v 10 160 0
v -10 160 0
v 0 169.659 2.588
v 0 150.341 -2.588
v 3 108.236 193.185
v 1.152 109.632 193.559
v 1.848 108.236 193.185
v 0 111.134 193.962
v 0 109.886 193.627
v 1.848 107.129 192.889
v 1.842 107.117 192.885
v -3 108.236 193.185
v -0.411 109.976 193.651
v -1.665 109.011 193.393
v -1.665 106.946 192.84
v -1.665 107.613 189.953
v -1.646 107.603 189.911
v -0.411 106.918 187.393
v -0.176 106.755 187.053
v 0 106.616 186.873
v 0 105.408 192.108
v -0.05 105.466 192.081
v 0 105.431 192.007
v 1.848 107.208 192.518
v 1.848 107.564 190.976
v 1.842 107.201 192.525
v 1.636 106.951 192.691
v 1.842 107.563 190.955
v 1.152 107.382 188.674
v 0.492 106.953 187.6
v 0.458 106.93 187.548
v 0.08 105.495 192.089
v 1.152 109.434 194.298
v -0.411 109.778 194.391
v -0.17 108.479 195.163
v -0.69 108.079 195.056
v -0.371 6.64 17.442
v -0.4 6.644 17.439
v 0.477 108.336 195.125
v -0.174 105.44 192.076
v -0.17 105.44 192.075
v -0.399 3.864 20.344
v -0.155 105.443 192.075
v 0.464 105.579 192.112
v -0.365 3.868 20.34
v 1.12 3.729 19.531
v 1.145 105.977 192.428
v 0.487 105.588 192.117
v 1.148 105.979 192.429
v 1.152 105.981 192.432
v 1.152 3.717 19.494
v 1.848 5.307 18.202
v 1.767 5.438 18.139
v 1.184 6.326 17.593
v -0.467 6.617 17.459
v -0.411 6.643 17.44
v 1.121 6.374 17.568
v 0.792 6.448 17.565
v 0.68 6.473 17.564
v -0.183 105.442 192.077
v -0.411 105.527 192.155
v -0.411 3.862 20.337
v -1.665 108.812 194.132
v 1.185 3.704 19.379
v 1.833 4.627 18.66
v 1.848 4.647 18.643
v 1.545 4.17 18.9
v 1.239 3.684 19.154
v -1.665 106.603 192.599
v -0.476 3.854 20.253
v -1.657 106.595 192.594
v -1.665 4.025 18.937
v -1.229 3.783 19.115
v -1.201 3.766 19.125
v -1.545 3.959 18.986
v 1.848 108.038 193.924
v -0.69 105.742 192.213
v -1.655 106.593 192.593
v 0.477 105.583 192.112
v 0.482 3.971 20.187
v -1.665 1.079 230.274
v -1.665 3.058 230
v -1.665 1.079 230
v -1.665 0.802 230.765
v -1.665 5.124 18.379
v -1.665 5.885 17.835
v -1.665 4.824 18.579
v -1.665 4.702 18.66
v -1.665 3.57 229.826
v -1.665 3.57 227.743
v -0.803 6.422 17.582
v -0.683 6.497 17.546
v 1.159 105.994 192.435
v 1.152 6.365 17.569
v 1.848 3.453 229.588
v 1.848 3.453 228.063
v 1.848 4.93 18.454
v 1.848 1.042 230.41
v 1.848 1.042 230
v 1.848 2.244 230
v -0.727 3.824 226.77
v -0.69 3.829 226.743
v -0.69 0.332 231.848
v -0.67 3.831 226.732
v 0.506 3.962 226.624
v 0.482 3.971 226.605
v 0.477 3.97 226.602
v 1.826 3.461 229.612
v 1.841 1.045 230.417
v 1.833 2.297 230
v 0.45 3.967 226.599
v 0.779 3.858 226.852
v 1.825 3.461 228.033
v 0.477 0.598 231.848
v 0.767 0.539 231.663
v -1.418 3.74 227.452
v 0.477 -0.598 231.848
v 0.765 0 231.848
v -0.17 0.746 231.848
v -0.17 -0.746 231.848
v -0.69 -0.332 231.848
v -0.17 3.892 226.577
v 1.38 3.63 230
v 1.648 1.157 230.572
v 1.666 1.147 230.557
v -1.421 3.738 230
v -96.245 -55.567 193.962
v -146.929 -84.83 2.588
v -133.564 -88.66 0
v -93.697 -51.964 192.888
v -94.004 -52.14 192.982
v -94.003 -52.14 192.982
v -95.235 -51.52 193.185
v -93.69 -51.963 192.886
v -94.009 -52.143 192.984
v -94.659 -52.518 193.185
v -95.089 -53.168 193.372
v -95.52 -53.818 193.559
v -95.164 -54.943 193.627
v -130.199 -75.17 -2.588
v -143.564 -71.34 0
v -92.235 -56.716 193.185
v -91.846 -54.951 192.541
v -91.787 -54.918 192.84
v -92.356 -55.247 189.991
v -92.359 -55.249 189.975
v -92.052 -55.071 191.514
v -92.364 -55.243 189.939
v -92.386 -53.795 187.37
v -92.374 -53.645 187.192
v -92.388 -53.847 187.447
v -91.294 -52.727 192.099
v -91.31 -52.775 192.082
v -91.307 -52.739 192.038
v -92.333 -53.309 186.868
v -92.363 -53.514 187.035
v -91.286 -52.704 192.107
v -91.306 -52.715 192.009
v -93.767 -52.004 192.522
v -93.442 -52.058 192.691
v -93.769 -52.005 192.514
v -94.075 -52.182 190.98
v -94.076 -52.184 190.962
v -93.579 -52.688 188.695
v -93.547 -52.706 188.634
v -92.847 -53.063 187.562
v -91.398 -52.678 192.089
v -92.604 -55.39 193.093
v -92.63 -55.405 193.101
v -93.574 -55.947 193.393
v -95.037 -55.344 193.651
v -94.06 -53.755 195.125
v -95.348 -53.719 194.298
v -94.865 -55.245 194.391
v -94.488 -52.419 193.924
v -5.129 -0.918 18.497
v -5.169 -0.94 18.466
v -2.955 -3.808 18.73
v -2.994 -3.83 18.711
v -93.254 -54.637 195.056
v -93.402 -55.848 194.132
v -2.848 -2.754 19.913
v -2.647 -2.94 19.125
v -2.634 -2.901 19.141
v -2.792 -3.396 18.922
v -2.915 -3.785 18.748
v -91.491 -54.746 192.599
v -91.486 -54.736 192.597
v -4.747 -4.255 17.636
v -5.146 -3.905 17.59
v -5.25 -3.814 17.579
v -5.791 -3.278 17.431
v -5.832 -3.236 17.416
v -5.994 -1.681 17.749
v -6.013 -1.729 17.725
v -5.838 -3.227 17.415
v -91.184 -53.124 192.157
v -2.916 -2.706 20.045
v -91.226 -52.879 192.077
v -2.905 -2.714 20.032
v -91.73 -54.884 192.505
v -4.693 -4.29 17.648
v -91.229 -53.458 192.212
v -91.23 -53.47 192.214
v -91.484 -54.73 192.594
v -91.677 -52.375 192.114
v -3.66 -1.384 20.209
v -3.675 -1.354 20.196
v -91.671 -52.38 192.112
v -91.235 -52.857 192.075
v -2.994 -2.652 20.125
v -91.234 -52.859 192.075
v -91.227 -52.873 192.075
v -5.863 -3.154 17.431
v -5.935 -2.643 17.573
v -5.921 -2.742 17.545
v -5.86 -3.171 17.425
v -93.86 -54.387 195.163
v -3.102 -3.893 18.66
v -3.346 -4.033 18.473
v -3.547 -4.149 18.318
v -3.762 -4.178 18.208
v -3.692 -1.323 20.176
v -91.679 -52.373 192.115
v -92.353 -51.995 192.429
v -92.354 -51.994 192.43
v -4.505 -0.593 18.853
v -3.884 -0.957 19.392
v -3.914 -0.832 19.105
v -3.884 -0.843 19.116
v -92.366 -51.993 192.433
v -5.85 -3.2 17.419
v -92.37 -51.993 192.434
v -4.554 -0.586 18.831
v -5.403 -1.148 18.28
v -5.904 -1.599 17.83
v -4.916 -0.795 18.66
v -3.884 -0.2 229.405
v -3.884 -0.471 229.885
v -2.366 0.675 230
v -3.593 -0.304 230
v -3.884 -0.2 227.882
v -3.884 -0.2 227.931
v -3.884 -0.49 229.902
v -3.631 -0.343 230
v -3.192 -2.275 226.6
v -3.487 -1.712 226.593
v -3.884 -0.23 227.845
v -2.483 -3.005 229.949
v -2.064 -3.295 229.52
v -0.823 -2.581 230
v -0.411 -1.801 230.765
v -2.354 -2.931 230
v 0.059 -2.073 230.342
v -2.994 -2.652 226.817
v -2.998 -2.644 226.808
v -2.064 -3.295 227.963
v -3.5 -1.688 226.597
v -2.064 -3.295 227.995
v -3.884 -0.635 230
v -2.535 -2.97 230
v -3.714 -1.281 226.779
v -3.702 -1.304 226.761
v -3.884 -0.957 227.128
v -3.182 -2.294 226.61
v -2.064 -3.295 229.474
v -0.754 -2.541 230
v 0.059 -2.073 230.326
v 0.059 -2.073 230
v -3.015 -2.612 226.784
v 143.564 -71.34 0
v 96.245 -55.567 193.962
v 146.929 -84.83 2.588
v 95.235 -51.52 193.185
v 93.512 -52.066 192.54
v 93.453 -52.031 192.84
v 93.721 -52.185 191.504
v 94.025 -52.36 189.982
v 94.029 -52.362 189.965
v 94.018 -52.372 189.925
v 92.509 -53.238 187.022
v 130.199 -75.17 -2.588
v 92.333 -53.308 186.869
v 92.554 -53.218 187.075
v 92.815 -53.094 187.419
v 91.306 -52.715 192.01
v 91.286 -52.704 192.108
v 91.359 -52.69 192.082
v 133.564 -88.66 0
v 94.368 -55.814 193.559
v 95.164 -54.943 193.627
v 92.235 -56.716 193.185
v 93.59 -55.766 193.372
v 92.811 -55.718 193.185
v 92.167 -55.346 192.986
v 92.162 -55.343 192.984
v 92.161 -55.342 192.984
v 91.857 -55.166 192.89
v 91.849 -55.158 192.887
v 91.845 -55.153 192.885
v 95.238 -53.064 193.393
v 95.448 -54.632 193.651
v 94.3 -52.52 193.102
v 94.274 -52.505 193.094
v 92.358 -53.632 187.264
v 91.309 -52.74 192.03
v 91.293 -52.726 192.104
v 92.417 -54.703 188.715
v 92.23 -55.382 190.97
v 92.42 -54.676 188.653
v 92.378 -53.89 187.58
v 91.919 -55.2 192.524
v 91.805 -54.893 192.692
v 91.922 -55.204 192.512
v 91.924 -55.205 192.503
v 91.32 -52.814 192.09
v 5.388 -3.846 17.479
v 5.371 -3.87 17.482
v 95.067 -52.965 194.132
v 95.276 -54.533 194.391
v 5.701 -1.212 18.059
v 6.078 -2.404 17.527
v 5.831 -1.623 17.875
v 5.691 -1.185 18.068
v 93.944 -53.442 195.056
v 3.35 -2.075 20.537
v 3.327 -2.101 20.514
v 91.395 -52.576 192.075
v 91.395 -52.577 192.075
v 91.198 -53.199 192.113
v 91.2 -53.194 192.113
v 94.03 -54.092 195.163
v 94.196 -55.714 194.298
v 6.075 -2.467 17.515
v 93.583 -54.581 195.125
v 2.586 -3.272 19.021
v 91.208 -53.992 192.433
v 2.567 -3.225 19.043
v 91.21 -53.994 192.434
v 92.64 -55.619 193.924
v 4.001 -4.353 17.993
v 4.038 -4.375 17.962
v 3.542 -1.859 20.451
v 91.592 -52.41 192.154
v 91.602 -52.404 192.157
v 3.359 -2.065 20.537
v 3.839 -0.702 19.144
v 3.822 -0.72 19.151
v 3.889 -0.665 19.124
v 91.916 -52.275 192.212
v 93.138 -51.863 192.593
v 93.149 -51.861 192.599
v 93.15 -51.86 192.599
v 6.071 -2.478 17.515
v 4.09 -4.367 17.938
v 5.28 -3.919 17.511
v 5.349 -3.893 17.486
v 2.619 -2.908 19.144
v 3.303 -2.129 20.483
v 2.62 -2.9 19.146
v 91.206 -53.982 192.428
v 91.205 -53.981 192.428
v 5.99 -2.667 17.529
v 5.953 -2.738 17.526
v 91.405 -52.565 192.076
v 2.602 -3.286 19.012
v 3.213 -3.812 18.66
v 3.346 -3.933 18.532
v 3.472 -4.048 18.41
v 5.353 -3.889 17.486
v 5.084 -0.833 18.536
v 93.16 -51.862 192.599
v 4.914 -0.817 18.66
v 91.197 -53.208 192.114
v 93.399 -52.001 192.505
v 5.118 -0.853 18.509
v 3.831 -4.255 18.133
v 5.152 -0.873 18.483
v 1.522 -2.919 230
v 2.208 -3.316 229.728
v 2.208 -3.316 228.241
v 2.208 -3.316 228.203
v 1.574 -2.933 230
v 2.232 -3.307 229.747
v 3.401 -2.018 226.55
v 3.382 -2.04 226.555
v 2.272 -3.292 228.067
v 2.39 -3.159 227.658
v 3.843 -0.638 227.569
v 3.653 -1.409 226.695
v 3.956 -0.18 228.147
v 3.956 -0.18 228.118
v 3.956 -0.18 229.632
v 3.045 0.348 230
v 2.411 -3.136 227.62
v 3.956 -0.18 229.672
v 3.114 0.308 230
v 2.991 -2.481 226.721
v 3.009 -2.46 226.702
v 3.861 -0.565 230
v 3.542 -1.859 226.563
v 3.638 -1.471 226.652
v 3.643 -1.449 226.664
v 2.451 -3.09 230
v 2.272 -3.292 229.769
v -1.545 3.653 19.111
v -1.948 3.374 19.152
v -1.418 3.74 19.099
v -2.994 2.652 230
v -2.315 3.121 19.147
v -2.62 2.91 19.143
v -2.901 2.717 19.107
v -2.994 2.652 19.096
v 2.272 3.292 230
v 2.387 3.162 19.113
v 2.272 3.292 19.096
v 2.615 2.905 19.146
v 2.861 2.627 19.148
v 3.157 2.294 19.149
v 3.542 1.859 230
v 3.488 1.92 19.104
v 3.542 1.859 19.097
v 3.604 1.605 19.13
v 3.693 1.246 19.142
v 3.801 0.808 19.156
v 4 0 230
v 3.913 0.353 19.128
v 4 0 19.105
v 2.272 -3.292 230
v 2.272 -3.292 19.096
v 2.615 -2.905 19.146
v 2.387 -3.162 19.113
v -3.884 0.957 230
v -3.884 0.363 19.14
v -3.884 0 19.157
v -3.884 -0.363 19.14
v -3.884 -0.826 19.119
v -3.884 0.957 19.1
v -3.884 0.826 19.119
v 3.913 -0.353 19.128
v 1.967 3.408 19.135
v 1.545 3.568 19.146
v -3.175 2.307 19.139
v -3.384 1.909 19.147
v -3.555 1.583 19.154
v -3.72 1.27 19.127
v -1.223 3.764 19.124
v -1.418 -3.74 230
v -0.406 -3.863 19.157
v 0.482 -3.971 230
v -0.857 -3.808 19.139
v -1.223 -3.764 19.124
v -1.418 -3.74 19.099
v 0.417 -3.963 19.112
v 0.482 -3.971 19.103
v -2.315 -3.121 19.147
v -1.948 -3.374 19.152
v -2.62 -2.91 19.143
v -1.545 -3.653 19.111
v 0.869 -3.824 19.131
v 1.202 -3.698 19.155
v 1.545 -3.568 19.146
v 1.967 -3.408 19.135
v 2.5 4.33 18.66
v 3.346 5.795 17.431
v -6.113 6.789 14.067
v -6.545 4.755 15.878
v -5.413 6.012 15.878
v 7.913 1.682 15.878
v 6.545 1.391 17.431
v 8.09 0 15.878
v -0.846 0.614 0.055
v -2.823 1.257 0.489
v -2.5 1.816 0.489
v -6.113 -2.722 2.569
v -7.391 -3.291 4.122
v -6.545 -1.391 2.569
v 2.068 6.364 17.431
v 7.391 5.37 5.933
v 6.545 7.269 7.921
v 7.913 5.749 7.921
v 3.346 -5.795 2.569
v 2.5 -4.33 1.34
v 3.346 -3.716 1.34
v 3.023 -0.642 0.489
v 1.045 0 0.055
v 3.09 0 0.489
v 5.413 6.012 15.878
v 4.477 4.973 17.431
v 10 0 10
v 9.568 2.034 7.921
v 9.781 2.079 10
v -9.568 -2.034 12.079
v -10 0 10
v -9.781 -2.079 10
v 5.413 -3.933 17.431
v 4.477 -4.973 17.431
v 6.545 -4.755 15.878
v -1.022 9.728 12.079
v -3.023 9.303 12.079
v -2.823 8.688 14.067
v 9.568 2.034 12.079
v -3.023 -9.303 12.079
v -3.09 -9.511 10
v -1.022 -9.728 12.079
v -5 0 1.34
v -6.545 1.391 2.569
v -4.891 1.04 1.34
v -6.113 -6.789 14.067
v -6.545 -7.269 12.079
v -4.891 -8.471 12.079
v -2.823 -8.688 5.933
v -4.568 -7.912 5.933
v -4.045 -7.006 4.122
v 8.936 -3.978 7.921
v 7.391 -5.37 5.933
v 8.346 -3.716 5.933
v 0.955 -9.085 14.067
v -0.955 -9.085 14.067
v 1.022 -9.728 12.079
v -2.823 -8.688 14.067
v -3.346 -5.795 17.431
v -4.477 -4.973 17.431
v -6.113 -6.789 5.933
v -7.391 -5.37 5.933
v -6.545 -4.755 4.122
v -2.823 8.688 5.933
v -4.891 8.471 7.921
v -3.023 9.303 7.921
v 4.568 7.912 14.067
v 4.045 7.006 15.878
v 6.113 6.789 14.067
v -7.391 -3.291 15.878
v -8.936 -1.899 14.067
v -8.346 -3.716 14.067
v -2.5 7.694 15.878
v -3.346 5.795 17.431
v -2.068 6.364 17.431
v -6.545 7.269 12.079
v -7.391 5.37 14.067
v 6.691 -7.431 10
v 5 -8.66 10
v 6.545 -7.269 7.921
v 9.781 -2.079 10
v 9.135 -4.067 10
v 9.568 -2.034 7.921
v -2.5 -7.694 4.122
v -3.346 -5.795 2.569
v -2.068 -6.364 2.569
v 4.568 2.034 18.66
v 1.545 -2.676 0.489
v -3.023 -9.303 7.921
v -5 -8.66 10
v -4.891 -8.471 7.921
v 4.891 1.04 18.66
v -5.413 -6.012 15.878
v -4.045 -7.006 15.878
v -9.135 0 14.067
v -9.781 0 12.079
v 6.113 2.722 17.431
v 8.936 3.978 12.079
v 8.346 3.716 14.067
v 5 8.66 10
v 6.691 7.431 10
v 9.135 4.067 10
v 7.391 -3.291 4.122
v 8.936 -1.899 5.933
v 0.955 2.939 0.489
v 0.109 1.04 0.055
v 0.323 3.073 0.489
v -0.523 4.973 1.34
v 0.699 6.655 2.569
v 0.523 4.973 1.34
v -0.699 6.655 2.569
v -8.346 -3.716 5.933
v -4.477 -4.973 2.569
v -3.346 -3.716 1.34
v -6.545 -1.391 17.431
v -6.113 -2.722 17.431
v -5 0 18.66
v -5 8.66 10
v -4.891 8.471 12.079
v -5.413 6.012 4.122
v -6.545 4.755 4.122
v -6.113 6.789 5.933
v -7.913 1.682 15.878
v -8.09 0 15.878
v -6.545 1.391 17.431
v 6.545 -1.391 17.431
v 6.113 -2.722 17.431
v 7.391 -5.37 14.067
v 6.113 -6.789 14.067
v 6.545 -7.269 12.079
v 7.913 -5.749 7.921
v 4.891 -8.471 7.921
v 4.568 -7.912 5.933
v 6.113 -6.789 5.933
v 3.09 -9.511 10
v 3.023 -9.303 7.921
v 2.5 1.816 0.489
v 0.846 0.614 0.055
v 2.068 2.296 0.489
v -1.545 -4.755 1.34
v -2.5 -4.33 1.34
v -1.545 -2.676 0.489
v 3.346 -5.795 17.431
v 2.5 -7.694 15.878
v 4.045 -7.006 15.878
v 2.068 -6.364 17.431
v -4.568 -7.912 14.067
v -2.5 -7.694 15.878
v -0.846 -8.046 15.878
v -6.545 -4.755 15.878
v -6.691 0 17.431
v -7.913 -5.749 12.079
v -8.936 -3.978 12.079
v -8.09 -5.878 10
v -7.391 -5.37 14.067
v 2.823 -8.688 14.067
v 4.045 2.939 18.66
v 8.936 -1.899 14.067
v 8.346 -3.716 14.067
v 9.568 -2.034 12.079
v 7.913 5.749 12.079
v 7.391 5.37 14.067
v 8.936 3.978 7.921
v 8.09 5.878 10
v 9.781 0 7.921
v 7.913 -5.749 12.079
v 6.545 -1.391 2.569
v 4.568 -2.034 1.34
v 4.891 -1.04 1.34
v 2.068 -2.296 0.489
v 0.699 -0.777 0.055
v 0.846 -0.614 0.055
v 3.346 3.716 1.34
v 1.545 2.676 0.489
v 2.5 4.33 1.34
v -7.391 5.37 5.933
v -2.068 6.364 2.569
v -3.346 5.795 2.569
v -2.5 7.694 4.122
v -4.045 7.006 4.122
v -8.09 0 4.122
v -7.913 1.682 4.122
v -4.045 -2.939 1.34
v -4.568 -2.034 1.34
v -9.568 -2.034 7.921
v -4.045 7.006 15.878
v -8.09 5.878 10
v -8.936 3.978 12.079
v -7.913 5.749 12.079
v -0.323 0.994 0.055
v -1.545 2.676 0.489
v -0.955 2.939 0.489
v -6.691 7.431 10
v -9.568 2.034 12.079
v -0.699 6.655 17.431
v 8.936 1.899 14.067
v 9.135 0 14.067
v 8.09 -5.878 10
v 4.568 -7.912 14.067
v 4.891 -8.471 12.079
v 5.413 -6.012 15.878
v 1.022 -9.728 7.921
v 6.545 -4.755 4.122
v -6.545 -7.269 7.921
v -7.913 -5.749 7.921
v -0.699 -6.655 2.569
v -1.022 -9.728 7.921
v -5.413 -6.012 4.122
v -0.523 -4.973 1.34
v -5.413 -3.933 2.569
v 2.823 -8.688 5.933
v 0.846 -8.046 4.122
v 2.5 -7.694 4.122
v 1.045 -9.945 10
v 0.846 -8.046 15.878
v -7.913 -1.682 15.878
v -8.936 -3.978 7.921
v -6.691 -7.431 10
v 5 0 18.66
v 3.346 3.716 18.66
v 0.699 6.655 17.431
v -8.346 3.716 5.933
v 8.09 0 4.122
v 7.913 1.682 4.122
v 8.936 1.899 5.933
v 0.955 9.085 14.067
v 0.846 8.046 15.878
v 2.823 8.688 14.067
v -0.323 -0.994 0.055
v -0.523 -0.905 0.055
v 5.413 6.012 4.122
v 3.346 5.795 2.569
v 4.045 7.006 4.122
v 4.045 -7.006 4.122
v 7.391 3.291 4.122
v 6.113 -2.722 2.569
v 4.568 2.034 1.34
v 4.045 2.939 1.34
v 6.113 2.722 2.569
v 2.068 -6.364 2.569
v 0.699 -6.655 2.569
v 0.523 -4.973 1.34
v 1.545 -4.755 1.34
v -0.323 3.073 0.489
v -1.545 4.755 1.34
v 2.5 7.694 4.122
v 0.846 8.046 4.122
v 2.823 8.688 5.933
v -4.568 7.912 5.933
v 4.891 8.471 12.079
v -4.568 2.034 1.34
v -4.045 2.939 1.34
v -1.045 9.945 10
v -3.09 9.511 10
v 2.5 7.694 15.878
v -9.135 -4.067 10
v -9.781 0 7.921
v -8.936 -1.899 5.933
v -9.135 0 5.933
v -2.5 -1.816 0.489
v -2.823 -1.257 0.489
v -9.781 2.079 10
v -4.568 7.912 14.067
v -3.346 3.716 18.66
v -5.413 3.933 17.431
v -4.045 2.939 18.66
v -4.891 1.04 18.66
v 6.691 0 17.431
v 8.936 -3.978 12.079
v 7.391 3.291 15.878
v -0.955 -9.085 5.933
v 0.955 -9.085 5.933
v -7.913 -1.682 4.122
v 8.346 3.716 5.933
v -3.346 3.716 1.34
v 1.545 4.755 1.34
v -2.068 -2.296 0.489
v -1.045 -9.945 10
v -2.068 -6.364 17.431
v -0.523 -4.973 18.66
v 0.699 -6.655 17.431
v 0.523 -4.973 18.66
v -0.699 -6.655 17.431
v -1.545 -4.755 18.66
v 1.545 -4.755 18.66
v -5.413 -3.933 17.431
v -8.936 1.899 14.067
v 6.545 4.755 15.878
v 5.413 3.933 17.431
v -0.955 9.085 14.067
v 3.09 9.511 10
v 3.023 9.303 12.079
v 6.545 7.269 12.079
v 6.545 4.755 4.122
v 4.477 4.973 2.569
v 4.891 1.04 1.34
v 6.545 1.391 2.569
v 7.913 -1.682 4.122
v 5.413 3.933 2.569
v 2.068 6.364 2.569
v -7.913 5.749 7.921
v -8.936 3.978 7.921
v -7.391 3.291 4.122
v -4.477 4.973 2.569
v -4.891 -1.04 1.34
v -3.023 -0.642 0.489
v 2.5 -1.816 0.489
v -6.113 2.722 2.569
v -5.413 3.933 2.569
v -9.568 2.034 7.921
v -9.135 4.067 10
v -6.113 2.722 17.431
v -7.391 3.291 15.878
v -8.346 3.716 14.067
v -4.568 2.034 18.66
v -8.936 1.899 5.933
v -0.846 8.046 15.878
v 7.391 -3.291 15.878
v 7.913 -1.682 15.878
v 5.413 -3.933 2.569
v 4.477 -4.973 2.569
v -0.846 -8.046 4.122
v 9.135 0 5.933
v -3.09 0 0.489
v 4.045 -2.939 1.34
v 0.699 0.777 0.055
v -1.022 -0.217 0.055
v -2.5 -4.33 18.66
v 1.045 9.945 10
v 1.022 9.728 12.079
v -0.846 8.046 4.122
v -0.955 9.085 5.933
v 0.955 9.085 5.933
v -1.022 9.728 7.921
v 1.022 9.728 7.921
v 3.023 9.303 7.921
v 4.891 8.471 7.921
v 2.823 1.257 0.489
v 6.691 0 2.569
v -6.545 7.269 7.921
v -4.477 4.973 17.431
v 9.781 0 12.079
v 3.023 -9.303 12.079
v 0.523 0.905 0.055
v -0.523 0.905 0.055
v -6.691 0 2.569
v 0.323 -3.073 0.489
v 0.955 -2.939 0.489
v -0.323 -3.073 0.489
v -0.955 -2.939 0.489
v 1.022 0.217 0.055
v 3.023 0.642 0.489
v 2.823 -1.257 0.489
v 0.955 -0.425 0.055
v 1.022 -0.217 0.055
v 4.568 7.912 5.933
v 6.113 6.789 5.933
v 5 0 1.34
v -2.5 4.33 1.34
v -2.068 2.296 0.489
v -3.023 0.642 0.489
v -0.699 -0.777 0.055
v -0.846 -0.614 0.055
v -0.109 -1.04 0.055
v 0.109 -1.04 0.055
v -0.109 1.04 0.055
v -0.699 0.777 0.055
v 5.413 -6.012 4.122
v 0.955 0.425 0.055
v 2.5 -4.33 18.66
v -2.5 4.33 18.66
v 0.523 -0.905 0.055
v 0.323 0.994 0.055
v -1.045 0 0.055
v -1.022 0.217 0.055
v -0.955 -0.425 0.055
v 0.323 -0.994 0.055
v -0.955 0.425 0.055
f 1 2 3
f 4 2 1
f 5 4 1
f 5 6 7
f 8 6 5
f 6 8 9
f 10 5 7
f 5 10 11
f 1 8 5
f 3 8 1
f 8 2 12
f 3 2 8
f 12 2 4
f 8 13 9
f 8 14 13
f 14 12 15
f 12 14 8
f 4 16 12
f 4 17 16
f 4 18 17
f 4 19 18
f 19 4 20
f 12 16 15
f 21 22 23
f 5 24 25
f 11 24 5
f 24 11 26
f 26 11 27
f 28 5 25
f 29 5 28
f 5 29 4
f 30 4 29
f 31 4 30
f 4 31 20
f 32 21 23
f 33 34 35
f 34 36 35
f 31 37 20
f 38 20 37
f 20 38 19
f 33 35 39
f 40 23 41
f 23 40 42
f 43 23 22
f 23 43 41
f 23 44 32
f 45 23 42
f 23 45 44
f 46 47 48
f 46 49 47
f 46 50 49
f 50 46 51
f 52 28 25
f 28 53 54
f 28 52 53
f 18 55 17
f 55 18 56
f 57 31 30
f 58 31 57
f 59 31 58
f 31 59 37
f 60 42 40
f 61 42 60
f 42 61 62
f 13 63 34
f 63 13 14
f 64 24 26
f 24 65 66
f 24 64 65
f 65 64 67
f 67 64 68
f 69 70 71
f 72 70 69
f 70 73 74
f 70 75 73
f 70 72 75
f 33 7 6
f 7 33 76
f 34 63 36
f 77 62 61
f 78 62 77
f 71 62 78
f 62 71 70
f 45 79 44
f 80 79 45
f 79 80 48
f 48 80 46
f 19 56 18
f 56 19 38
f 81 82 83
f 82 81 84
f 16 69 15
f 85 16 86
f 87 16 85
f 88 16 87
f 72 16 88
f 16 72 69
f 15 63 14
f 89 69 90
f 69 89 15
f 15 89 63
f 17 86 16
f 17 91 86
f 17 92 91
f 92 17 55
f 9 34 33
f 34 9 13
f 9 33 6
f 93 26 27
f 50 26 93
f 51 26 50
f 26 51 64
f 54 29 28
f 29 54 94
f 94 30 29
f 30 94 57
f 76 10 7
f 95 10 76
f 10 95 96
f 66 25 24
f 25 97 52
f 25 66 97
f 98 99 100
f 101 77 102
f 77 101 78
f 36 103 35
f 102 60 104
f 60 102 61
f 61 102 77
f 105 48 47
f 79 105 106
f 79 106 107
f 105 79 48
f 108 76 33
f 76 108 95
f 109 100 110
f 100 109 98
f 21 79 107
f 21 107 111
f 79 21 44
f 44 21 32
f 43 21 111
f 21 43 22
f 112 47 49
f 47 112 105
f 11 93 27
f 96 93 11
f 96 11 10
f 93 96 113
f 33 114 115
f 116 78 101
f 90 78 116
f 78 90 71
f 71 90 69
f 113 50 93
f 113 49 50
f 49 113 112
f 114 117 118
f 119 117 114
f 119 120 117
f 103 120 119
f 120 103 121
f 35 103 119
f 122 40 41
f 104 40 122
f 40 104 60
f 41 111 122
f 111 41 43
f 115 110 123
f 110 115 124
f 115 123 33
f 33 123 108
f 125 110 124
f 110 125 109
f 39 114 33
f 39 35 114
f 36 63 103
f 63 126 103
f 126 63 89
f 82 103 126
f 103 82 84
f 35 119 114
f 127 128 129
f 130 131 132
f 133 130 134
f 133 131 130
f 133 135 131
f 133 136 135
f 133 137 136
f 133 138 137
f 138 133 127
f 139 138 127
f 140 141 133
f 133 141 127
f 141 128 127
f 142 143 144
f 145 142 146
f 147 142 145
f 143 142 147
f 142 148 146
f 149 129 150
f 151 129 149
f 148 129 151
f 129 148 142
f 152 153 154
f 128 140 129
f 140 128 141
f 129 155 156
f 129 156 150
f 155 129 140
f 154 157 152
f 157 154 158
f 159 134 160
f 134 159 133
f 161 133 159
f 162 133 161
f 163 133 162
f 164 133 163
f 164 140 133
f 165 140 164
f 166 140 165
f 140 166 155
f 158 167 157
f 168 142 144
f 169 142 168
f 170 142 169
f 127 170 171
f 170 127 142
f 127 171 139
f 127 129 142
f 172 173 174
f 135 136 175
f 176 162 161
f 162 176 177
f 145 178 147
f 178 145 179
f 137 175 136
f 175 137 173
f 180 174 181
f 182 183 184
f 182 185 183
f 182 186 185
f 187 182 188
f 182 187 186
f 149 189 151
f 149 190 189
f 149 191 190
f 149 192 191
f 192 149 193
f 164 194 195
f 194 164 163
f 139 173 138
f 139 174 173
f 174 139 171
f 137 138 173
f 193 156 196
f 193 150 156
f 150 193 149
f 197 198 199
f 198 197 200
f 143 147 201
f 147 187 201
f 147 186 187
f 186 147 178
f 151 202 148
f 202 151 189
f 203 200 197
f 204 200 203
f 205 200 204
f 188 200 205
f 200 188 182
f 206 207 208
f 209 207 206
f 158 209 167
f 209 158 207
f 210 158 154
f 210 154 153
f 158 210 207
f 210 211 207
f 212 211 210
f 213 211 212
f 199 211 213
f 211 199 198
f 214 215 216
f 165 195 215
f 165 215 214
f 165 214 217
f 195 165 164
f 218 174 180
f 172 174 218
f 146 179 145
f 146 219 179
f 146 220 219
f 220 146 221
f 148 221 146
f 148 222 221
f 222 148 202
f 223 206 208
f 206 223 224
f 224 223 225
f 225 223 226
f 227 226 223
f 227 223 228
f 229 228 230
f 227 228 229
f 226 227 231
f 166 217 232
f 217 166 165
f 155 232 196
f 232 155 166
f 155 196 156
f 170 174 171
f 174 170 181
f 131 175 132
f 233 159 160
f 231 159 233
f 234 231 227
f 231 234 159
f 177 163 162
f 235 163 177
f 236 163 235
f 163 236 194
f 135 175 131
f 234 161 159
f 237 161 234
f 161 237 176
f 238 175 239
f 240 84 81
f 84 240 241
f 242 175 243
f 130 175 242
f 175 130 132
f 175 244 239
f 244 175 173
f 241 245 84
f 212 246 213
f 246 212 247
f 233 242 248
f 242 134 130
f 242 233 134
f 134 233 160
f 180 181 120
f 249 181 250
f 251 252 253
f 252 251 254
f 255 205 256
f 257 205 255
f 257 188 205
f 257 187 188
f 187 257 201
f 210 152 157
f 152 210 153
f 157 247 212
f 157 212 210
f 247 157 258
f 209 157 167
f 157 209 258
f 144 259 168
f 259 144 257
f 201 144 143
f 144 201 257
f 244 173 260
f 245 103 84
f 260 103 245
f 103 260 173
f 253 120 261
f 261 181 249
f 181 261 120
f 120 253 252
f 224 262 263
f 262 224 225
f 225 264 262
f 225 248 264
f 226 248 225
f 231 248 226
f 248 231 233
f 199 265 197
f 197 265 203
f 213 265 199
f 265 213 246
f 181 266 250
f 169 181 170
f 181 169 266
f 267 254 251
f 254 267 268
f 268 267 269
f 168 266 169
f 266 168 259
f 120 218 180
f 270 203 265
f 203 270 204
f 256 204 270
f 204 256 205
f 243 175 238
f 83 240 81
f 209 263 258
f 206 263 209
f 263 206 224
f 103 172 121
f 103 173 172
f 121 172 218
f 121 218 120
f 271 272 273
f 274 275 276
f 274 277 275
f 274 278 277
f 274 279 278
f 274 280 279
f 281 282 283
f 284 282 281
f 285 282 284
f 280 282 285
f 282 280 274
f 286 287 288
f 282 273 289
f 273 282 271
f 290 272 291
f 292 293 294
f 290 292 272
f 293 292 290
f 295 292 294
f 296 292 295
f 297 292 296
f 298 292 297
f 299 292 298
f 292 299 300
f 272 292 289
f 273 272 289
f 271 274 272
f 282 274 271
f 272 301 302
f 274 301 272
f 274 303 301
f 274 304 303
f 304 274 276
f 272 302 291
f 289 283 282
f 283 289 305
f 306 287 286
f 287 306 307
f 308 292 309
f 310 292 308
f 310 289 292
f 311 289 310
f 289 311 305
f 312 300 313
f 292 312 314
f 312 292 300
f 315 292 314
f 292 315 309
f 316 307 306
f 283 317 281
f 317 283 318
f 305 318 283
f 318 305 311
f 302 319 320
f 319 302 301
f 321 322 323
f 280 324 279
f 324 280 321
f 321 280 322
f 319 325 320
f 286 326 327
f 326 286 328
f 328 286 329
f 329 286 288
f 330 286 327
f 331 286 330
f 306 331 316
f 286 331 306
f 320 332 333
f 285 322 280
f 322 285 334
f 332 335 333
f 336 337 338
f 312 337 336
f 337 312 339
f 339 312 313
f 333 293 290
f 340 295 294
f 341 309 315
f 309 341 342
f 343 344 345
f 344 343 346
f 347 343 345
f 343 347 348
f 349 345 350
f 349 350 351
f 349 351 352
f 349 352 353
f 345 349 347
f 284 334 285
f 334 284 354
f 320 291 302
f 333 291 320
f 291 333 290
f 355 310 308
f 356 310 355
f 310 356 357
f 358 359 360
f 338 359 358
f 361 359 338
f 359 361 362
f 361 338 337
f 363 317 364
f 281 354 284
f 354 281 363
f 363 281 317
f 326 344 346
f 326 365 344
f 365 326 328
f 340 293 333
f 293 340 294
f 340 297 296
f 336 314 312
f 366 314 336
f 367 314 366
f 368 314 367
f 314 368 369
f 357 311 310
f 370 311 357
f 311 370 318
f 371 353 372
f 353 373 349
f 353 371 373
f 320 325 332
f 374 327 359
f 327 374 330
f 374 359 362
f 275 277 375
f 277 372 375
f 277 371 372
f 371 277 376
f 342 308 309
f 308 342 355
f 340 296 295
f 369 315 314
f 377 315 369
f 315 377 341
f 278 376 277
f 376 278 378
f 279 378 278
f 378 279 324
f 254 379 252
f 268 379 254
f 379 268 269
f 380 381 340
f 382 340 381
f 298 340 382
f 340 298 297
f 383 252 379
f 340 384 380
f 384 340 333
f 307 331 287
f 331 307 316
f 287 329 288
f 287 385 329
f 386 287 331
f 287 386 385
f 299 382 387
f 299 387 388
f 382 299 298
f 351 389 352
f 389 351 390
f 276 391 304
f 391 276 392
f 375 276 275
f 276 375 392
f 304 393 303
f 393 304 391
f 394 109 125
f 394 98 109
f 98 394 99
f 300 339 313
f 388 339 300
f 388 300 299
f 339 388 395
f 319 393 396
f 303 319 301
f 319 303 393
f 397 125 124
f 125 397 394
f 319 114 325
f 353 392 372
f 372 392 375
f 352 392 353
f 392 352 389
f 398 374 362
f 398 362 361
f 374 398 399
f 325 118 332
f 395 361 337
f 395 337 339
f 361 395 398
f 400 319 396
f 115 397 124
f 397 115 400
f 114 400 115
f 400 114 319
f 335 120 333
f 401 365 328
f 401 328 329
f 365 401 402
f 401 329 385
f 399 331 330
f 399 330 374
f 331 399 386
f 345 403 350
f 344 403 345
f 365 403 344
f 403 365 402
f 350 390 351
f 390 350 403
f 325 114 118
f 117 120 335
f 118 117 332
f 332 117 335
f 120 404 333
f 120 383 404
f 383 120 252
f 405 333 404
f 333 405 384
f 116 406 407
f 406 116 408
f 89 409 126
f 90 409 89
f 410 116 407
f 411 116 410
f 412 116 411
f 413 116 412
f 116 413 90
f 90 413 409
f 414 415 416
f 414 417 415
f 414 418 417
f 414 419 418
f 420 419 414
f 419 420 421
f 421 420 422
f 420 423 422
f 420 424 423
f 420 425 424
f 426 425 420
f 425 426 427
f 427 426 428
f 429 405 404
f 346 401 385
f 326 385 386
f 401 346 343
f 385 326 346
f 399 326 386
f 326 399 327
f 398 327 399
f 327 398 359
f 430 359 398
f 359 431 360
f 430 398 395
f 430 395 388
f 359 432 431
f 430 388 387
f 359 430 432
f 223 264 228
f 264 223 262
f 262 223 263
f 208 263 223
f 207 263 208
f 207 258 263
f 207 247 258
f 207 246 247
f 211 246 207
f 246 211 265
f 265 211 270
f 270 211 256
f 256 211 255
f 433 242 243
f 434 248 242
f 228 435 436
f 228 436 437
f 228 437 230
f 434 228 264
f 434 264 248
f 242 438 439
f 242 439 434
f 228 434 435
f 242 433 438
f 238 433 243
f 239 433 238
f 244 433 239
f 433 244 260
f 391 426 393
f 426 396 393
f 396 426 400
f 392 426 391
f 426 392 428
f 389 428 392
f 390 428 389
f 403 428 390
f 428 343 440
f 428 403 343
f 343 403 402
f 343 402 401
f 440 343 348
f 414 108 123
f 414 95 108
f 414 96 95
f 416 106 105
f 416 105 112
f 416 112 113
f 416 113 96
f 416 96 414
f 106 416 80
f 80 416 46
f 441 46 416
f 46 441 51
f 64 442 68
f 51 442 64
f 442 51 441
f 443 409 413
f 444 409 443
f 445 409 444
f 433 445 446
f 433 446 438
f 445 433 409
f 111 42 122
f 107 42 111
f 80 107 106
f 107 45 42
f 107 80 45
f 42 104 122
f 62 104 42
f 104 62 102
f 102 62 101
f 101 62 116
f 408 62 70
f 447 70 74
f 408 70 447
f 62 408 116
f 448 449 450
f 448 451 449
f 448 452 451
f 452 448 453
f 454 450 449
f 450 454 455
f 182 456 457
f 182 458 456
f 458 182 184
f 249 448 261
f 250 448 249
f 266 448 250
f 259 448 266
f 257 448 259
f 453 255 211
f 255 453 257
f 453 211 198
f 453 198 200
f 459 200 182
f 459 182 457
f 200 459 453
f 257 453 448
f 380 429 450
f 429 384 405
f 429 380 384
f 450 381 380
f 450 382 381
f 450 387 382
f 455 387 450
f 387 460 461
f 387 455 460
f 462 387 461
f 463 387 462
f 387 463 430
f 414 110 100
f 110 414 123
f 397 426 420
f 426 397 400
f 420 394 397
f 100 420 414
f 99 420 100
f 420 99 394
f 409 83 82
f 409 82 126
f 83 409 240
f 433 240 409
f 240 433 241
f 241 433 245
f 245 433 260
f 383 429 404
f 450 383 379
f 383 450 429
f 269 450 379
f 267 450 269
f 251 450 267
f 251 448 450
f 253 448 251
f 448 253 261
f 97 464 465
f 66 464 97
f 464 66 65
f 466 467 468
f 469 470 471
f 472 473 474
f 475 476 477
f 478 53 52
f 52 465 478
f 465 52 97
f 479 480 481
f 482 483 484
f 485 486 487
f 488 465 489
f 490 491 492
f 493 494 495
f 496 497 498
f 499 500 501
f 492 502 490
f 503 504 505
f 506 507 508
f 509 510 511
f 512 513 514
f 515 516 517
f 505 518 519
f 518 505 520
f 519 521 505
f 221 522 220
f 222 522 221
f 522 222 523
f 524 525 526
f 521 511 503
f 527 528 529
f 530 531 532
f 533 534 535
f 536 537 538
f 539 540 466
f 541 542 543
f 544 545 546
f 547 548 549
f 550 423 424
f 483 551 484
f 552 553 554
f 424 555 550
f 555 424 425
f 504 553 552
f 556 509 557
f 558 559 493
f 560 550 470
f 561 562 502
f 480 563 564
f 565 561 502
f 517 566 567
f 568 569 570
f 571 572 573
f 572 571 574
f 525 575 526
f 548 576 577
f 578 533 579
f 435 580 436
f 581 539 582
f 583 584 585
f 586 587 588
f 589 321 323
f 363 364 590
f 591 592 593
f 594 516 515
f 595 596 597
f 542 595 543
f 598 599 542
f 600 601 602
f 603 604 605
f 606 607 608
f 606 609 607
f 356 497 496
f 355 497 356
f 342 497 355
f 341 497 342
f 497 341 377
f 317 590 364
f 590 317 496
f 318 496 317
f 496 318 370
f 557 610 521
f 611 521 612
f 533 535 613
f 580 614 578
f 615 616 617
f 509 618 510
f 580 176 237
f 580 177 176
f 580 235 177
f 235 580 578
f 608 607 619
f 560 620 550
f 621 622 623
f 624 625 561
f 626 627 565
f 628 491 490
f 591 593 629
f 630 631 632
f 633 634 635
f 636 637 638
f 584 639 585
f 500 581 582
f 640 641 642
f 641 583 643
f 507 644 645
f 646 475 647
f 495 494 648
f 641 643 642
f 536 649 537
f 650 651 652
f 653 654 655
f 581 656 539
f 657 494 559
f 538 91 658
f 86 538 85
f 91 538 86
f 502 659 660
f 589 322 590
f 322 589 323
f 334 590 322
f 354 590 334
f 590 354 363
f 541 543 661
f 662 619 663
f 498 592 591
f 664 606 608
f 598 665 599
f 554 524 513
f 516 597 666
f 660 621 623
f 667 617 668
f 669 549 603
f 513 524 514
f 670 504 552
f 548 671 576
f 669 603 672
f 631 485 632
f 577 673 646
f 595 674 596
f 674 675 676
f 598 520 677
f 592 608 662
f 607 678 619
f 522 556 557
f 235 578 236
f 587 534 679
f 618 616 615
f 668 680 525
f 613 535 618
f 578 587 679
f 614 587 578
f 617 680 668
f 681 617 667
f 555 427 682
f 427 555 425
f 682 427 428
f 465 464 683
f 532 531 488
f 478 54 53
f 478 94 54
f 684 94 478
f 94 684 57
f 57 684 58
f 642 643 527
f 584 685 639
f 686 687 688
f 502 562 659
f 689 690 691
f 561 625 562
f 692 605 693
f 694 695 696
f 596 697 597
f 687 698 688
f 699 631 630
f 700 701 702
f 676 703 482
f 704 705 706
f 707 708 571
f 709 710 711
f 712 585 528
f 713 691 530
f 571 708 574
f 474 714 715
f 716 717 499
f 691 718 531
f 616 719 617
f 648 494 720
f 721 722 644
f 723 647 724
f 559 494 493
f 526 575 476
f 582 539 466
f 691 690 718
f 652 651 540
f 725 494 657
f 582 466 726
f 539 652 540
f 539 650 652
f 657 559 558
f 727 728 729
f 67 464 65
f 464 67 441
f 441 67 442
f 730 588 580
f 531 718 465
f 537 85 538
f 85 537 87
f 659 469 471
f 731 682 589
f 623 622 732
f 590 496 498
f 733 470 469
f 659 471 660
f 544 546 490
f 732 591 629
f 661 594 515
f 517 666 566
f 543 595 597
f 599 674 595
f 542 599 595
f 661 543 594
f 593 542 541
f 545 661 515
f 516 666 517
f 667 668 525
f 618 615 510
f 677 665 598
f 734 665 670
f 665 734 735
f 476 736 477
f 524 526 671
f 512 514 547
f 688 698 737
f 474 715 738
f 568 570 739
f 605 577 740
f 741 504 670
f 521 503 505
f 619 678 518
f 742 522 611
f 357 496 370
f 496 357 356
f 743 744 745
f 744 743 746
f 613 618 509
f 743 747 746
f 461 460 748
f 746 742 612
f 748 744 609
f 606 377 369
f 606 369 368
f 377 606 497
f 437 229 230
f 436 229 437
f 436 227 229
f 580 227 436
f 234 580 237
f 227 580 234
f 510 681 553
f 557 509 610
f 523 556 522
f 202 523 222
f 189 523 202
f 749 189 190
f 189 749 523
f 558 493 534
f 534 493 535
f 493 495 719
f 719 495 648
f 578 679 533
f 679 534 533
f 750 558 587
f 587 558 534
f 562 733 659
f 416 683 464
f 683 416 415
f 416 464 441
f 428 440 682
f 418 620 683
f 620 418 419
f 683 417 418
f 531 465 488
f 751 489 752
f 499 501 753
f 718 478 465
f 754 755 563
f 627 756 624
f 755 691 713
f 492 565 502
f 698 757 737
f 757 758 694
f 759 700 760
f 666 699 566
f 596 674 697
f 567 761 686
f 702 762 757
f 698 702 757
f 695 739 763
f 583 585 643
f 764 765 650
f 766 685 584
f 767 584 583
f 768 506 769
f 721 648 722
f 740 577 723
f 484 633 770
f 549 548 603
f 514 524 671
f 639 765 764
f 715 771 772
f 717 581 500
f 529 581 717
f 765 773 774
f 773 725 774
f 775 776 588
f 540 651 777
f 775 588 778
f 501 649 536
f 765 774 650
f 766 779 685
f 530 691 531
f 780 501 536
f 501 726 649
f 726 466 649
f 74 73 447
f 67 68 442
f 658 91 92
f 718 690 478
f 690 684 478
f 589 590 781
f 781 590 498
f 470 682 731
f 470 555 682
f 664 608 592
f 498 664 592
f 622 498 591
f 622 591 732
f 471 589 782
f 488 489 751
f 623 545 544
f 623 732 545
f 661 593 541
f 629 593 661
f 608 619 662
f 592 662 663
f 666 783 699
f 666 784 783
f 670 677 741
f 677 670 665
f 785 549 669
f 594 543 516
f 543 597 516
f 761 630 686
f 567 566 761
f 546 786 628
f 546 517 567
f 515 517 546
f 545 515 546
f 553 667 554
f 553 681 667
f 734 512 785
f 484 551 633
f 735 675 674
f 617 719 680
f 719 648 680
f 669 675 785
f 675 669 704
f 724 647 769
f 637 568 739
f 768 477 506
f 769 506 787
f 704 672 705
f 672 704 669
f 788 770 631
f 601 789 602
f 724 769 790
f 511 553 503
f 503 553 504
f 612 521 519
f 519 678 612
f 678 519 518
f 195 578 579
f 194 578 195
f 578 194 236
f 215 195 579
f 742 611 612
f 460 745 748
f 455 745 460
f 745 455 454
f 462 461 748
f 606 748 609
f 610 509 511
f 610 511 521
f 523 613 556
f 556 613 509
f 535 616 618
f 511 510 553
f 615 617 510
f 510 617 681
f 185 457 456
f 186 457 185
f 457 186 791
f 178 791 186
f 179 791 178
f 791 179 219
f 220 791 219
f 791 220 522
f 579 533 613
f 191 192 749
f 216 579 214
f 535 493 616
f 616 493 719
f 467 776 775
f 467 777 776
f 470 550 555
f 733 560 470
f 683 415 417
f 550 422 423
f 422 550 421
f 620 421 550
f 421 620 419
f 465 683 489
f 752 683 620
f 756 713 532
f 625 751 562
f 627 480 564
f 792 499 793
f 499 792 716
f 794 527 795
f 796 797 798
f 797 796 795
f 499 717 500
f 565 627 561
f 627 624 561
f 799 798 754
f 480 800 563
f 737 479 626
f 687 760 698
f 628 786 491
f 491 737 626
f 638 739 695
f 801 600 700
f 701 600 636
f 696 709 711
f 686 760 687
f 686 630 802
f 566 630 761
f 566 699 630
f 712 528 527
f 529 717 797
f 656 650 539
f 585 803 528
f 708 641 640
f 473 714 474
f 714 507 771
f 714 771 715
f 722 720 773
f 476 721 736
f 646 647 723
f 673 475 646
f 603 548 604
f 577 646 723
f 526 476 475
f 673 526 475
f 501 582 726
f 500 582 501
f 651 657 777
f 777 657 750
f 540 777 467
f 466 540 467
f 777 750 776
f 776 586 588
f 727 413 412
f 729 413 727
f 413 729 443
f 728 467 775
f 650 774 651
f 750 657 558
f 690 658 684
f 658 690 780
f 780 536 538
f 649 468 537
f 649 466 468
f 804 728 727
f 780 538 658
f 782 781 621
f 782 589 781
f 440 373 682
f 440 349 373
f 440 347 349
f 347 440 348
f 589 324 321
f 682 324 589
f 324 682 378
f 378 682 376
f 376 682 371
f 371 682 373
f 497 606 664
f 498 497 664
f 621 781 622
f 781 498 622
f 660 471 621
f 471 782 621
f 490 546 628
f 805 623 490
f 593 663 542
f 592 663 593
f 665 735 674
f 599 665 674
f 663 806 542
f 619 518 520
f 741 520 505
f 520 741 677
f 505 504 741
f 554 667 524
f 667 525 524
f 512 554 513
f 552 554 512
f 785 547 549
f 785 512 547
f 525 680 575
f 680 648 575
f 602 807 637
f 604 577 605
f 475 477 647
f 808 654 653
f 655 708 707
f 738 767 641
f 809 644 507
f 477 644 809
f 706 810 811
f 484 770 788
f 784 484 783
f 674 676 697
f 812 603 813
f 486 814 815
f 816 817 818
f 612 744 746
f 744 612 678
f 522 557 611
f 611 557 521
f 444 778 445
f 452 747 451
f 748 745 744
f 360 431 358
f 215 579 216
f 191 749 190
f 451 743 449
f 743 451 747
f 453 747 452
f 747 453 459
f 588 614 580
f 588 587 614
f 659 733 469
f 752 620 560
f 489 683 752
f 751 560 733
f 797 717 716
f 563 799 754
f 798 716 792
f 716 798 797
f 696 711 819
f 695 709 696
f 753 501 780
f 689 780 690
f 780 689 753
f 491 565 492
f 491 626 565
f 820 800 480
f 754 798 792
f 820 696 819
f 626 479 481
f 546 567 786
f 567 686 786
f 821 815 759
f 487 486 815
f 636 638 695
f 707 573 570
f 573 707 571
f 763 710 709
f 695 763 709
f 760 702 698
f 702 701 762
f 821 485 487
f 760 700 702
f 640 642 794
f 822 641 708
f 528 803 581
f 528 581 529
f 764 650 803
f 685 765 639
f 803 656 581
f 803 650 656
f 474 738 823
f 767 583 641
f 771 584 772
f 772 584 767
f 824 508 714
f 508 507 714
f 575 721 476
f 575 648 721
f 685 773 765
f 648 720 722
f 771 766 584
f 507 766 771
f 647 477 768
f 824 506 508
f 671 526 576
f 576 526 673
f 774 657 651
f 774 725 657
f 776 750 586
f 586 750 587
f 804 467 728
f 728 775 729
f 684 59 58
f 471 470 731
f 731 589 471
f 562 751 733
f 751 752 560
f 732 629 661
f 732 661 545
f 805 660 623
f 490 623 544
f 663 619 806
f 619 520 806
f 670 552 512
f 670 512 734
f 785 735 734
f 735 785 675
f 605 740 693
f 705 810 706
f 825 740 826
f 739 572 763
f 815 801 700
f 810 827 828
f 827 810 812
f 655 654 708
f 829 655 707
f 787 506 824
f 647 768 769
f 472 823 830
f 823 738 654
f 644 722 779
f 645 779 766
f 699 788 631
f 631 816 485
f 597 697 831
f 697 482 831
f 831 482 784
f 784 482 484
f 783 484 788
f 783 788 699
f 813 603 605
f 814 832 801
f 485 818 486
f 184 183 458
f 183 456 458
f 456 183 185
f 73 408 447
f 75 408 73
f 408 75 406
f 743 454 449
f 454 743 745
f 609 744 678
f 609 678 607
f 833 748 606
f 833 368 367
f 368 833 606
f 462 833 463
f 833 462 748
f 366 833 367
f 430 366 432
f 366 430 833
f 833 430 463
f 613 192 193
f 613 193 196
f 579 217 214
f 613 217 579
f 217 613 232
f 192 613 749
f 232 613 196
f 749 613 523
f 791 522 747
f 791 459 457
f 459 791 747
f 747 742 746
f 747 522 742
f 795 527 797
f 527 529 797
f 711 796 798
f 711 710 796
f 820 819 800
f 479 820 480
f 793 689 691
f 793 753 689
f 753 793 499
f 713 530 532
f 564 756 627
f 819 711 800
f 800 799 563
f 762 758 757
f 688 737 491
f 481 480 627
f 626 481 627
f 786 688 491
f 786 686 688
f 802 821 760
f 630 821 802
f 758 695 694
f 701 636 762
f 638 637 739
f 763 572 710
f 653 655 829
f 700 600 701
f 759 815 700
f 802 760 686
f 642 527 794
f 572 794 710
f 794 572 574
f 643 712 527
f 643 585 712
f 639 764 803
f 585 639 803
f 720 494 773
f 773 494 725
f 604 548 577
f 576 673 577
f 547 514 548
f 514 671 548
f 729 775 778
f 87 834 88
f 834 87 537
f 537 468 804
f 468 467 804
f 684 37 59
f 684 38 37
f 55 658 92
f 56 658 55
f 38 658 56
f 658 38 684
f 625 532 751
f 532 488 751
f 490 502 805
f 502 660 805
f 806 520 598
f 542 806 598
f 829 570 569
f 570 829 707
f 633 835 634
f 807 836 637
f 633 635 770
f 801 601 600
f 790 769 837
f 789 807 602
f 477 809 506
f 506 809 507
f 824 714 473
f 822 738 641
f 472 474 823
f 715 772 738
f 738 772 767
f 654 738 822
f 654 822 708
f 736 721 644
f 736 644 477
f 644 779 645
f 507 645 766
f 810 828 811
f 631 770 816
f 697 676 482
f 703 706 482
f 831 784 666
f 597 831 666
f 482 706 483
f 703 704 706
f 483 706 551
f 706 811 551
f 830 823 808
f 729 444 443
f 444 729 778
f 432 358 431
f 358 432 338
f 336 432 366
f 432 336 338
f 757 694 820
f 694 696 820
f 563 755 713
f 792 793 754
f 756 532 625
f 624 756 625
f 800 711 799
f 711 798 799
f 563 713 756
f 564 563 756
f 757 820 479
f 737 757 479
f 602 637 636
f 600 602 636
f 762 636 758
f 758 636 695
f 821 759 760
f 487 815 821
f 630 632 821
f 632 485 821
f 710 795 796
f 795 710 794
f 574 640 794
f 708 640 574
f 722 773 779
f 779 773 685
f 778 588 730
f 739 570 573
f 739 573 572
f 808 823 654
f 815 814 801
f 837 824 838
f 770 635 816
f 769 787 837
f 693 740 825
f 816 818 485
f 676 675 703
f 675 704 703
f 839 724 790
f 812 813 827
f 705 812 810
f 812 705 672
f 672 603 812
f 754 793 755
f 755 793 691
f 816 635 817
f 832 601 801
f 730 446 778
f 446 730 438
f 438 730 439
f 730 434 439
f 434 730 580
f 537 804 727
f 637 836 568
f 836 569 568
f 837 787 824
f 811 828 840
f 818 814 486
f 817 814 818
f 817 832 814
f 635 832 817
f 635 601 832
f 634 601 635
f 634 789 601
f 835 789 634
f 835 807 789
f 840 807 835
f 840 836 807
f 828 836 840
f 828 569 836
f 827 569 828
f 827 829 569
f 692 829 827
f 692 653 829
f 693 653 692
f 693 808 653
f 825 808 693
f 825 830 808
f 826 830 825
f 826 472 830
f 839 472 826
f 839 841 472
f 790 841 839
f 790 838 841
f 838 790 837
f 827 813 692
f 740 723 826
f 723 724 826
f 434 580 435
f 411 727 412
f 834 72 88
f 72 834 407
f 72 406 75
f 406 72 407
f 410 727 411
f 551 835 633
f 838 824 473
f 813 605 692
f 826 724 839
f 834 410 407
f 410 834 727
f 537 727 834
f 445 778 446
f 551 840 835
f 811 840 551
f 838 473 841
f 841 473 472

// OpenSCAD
//Variable describing the cranes
//The height of the crane units are whatever could be feet
crane_h = 200;
//Distance from center to the base from each crane
crane_r = 160;
//Size of the base of the crane
crane_b = 10;

//Degrees of tilt
crane_tilt = 15;

//Cable radius.  Big enough to see. 2 foot is ridiculous
cable_r = 2;

//Radius of the effector. Once again big enough to see
eff_r = 10;

//Height of the rod
rod_l = 220;
//Radius of rod. Once again big enough to see
rod_r = 4;

/*
* This array represents x,y,z locations that the crane
* moves to.  Note that the array is doubly indexed.  So that creates
* an array of vectors. Which are themselves an array of three
*/
loc = [
    [0,0,10],
    [50,50,10],
    [-50,50,50],
    [-50,-50,10],
    [40,-40,30],
    [40,40,10],
    [50,0,40],
    [0,0,10]
      ];


/*
* This is the secret sauce.  The lookup function does interpolations
* between entries.  A lookup table has a series of keys and values.
* The keys must be monotonic. That is they all increase in value from
* one to the next or they all decrease in value.  Then when a key is
* passed that is in between two key values.  The lookup function
* interpolates between the two.
*
* The key values are given values from 0 to 1 by dividing by the 
* len of the array of vectors.  This makes the keys represent
* possible values of $t.  The values are points in the loc array.
*
* The lookup table can have variables as values.  So we effectively
* have three lookup tables. See below for example with constants.
*
* 
*/
function xyz(t,i) = 
    lookup(t, [
    [0/len(loc),loc[0][i]],
    [1/len(loc),loc[1][i]],
    [2/len(loc),loc[2][i]],
    [3/len(loc),loc[3][i]],
    [4/len(loc),loc[4][i]],
    [5/len(loc),loc[5][i]],
    [6/len(loc),loc[6][i]],
    [7/len(loc),loc[7][i]],

]);

/*
* This is the actual way I wrote this function.  I rewrote it in the
* above way because I thought it might be clearer what is happening
*/
//function xyz(t,i) = 
//  lookup(len(loc)*t, [
//  [0,loc[0][i]],
//  [1,loc[1][i]],
//  [2,loc[2][i]],
//  [3,loc[3][i]],
//  [4,loc[4][i]],
//  [5,loc[5][i]],
//  [6,loc[6][i]],
//  [7,loc[7][i]],
//
//]);
//

/*
* I am showing these as an example of one variable in the lookup
* table.  This approach is fine if one has one variable or several
* unrelated variables.  Because x,y, and z represent points that the
* effector is being moved to, the array approach is easier to make
* changes to the path.
*
* The cranes module would be called like this.
* cranes(X($t),Y($t),Z($t));
*/
function X(t) = 
    lookup(t, [
    [0/len(loc),0],
    [1/len(loc),50],
    [2/len(loc),-50],
    [3/len(loc),-50],
    [4/len(loc),40],
    [5/len(loc),40],
    [6/len(loc),50],
    [7/len(loc),0],

]);function Y(t) = 
    lookup(t, [
    [0/len(loc),0],
    [1/len(loc),50],
    [2/len(loc),50],
    [3/len(loc),-50],
    [4/len(loc),-40],
    [5/len(loc),40],
    [6/len(loc),0],
    [7/len(loc),0],

]);function Z(t) = 
    lookup(t, [
    [0/len(loc),10],
    [1/len(loc),10],
    [2/len(loc),50],
    [3/len(loc),10],
    [4/len(loc),30],
    [5/len(loc),10],
    [6/len(loc),40],
    [7/len(loc),10],

]);

//Call the main module with variables that depend on $t
cranes(xyz($t,0),xyz($t,1),xyz($t,2));


module cranes(x,y,z)
{
    //Create three cranes and cables 120 degrees apart
    for(i=[0:120:359])
    {
        rotate([0,0,i])
        translate([0,crane_r,0])
        crane();
        //Create the cable going down to the effector
        cable(i,x,y,z);
        //Create the cable going to the top of the rod.
        cable(i,x,y,z+rod_l);
    }
    //Create the rod
    color("brown")
    translate([x,y,z])
    cylinder(r=rod_r,h=rod_l,center=false);
    //Create the effector
    color("red")
    translate([x,y,z])
    sphere(eff_r);
}

/*
* Tricky way to make a cable.  We hull between a cable sized
* sphere at the top of the crane and one at the x,y,z location
* of the other end (effector or top of rod).
*/
module cable(ang,x,y,z)
{
    color("silver")
    hull()
    {
        rotate([0,0,ang])
        translate([0,crane_r,0])
        rotate([crane_tilt,0,0])
        translate([0,0,crane_h])
        sphere(cable_r);
        translate([x,y,z])
        sphere(cable_r);
    }
}

//Simple crane
module crane()
{
    color("black")
    rotate([crane_tilt,0,0])
    cylinder(r1=crane_b,r2=3,h=crane_h,$fn=4);
}
